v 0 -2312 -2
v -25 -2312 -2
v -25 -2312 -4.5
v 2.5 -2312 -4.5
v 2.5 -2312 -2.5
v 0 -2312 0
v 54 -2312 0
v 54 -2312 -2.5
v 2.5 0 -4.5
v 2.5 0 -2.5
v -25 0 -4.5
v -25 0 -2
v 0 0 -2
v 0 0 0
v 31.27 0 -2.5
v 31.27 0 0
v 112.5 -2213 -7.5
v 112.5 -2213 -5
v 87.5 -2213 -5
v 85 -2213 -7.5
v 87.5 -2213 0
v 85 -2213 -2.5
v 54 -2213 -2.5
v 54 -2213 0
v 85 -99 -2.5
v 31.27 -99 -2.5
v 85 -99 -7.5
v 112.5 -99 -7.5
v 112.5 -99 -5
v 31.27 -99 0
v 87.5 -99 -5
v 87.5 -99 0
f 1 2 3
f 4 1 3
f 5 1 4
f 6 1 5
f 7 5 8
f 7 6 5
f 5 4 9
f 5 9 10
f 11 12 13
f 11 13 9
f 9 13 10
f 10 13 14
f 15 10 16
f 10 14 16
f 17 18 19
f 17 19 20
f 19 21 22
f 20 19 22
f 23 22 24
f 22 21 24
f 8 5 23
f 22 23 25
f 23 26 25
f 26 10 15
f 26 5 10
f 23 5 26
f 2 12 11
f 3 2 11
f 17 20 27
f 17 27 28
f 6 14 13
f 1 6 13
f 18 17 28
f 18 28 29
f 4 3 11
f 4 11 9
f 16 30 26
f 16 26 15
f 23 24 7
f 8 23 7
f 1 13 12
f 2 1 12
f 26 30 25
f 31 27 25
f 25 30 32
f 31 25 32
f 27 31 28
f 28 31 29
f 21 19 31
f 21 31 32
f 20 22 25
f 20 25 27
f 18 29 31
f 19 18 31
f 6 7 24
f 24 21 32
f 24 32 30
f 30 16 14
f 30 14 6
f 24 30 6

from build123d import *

# Parameters (mm, degrees)
F1_DEPTH = 2312
F2_W     = 56.23
F2_H     = 99
F2_W_2   = 25
F2_W_3   = 33.5
F3_DEPTH = 7.501


# Not quite as in the source:
# - a feature names something its author has since deleted; it is built from what else it names


with BuildPart() as f1:
    # F0 (on Front) → F1 (new body)
    with BuildSketch(Plane.XZ):
        Polygon((87.5, 0), (0, 0), (0, -2), (-25, -2), (-25, -4.5), (2.5, -4.5), (2.5, -2.5), (85, -2.5), (85, -7.5), (112.5, -7.5), (112.5, -5), (87.5, -5), align=None)
    extrude(amount=F1_DEPTH)

    # F2 (on face) → F3 (cut, through all)
    with BuildSketch(Plane.XY):
        with Locations((59.385, -49.5)):
            Rectangle(F2_W, F2_H)
        with Locations((100, -49.5)):
            Rectangle(F2_W_2, F2_H)
        Polygon((127.1371338549, -2213), (87.5, -2213), (87.5, -2312), (54, -2312), (54, -2342.1576023102), (127.1371338549, -2342.1576023102), align=None)
        with Locations((70.75, -2262.5)):
            Rectangle(F2_W_3, F2_H)
    extrude(amount=-F3_DEPTH, mode=Mode.SUBTRACT)


solid = f1.part
